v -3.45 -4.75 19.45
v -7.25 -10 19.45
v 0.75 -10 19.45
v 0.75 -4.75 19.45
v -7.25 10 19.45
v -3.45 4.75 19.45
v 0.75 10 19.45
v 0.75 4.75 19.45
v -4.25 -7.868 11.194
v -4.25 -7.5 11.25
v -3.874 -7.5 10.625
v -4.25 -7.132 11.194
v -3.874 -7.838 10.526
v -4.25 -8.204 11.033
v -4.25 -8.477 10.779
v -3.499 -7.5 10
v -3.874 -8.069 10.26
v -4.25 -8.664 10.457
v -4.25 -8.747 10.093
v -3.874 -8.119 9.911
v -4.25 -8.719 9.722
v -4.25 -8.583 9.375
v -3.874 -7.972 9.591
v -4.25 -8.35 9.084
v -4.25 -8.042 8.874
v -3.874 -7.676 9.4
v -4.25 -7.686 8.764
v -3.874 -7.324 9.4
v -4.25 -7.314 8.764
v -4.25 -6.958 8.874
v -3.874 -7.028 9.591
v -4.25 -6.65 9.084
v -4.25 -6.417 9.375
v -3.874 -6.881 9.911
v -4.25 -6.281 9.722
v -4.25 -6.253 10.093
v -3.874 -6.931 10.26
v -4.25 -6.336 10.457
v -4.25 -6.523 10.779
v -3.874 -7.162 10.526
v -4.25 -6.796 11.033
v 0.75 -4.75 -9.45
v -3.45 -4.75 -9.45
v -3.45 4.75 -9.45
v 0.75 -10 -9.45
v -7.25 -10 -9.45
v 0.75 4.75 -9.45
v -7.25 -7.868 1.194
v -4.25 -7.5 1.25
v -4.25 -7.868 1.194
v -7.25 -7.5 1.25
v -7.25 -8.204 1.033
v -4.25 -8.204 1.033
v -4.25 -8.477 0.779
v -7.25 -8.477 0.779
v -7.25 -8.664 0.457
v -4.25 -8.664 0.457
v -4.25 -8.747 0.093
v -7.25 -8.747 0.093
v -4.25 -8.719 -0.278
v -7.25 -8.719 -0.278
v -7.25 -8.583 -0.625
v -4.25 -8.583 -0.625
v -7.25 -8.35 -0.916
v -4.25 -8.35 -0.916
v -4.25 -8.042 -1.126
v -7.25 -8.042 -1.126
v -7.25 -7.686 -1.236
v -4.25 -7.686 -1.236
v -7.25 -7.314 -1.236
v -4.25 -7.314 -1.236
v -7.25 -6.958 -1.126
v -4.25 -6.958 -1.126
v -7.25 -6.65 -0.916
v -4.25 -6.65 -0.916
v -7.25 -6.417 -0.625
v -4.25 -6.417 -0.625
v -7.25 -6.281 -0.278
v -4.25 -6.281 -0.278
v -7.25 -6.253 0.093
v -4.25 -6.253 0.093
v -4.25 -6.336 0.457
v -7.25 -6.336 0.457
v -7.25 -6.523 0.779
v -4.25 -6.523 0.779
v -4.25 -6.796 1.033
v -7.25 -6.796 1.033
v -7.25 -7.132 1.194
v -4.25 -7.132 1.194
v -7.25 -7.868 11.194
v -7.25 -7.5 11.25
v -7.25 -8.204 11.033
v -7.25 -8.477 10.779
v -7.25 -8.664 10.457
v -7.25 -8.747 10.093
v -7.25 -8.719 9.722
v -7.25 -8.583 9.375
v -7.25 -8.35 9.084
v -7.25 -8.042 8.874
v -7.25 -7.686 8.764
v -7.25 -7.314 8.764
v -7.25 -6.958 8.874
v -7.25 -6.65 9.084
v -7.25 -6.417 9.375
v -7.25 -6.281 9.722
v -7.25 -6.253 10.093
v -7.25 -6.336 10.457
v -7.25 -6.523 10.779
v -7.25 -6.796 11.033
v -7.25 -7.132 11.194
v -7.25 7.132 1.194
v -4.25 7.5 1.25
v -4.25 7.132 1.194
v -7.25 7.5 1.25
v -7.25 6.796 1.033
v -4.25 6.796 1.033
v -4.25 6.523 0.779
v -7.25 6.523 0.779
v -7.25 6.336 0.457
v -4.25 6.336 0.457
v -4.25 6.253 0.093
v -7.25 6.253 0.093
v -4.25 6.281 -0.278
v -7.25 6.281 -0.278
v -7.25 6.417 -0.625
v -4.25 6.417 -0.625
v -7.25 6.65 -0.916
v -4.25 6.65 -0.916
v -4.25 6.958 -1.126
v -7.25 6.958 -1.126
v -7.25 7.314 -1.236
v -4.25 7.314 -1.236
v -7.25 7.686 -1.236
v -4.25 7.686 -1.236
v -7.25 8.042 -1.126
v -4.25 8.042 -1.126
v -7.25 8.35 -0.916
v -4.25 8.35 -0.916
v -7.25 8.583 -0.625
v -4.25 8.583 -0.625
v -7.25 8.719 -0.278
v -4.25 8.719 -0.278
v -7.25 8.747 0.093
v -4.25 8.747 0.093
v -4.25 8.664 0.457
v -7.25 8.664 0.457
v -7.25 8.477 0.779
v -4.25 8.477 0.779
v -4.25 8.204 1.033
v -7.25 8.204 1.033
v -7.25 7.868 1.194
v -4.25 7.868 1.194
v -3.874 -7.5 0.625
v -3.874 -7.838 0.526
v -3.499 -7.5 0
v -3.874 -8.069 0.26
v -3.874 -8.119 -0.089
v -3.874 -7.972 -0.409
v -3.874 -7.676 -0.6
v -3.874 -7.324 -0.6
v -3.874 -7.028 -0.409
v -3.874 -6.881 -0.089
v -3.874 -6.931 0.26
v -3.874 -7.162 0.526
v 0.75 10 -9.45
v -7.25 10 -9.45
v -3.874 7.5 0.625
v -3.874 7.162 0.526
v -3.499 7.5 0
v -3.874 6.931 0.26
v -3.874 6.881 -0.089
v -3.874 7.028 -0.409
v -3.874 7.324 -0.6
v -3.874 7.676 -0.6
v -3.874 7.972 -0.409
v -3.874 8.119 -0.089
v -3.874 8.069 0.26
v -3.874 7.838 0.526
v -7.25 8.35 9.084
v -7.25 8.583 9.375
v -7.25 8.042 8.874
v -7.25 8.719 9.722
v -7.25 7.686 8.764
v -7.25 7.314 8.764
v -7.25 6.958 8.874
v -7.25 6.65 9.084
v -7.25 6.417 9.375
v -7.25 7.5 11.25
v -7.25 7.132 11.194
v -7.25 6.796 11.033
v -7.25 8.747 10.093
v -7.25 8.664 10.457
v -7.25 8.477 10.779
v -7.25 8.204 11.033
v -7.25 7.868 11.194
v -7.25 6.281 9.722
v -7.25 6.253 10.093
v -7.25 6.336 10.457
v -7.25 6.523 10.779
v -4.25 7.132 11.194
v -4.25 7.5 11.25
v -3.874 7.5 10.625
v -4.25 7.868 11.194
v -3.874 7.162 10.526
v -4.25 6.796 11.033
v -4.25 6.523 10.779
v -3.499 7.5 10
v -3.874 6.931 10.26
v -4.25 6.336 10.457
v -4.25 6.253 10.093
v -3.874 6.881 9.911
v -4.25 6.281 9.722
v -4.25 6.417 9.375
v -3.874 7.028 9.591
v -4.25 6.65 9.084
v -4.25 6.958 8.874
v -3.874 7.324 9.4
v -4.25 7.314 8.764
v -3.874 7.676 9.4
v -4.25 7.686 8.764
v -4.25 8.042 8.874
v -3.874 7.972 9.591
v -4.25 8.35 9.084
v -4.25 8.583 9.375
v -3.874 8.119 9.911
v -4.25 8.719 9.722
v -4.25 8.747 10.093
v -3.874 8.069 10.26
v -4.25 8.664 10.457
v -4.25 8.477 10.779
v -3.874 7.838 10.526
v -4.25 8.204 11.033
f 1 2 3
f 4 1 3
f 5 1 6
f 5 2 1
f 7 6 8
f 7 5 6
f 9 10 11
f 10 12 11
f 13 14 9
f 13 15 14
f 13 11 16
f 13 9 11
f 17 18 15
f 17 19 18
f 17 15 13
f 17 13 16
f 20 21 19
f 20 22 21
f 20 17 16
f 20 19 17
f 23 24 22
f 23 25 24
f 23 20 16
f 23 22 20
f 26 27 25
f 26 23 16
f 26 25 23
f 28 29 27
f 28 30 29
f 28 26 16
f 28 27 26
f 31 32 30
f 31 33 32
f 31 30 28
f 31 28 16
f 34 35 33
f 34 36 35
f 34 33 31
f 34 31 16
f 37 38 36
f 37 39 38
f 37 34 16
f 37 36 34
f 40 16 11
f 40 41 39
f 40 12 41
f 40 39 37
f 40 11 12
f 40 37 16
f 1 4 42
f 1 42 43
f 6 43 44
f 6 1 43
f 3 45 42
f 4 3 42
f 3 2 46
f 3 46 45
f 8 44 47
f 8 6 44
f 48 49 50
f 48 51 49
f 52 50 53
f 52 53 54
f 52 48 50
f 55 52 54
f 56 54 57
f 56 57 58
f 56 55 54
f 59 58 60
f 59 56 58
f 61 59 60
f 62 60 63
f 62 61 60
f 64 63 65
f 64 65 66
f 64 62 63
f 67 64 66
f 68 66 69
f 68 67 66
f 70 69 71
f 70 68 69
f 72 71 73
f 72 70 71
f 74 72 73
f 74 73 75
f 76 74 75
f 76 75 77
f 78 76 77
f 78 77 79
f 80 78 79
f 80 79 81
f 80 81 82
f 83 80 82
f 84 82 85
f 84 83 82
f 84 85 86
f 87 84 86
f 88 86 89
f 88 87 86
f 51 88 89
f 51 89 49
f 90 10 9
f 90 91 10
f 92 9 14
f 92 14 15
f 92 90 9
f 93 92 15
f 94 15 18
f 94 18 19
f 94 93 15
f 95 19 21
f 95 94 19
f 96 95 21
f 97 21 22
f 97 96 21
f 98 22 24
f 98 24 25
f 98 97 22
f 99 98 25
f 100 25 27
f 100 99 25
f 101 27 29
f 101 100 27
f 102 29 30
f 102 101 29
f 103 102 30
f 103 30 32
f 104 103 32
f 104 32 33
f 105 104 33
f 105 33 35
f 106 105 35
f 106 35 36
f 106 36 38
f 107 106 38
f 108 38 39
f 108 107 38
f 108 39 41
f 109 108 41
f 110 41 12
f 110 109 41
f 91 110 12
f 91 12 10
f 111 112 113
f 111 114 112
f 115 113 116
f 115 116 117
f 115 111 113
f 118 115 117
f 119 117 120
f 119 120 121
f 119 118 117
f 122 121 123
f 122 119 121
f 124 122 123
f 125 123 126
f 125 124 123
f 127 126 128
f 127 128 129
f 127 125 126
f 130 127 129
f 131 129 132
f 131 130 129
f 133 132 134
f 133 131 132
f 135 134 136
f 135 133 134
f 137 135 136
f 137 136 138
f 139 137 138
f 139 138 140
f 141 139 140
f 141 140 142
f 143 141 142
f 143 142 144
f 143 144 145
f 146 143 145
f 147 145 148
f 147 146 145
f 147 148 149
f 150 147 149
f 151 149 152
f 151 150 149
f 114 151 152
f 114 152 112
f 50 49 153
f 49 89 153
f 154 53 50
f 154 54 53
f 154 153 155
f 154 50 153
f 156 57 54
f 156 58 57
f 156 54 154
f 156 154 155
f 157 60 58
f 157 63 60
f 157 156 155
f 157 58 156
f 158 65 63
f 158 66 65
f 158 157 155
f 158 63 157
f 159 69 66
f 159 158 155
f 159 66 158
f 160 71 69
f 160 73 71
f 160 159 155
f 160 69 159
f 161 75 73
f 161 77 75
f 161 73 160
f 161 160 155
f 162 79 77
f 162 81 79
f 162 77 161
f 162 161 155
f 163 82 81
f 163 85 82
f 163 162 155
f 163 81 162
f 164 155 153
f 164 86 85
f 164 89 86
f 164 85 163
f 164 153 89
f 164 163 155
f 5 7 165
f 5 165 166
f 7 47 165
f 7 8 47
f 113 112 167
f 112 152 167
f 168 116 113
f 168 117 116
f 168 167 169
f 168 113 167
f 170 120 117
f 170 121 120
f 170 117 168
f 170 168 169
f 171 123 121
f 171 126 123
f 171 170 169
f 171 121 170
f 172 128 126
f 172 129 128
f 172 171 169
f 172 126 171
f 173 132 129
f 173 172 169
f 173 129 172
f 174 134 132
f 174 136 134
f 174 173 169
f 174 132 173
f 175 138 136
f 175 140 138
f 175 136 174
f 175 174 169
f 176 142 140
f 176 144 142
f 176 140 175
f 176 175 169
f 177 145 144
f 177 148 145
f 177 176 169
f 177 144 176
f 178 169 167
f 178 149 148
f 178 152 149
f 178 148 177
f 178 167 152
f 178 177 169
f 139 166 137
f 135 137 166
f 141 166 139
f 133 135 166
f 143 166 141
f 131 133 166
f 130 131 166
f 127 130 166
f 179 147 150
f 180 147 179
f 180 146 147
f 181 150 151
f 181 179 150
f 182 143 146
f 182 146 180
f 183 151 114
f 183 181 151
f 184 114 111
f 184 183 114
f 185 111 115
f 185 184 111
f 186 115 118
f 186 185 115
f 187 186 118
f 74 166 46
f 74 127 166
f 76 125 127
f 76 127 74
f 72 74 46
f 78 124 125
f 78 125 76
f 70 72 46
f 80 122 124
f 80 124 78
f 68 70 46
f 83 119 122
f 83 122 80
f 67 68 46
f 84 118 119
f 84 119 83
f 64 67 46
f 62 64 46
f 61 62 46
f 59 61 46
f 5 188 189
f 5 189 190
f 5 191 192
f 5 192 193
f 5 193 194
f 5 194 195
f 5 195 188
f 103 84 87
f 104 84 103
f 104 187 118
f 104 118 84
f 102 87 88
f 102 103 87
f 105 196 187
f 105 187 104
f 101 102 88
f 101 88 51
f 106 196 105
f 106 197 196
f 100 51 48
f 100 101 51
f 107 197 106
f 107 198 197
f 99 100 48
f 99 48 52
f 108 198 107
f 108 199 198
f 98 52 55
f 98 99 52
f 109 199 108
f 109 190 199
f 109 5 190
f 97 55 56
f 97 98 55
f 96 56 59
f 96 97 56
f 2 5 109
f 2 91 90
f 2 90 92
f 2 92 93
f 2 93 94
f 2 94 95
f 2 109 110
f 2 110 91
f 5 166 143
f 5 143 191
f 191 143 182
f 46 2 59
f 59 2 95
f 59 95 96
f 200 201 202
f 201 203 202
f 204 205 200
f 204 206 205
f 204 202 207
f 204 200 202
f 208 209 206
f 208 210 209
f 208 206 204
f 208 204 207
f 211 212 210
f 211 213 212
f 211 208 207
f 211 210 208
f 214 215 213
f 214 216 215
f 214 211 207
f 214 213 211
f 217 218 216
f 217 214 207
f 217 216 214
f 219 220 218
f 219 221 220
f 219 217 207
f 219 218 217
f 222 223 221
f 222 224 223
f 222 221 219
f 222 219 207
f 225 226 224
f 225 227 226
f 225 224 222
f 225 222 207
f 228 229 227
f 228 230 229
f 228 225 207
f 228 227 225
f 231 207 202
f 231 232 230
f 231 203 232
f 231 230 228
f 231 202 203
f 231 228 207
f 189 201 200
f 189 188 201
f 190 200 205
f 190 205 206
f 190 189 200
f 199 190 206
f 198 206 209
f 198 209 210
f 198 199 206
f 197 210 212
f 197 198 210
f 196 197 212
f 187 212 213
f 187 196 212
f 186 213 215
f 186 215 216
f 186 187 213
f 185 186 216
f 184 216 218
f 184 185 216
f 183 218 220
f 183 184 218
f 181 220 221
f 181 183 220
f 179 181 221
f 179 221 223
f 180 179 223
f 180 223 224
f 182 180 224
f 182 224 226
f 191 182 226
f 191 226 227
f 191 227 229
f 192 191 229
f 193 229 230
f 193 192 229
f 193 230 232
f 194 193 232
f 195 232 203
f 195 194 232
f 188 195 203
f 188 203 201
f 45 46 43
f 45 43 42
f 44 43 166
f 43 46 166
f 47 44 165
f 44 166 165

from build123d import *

# Parameters (mm, degrees)
SKETCH1_W                      = 6.5
SKETCH1_H                      = 9
BOSS_EXTRUDE1_DEPTH            = 150
BOSS_EXTRUDE2_DEPTH            = 14.45
M3X0_5_TAPPED_HOLE1_AT_2_COUNT = 2
M3X0_5_TAPPED_HOLE1_AT_2_PITCH = 18.027756377
M3X0_5_TAPPED_HOLE1_AT_3_COUNT = 2
M3X0_5_TAPPED_HOLE1_AT_3_PITCH = 15
M3X0_5_TAPPED_HOLE1_AT_4_COUNT = 2
M3X0_5_TAPPED_HOLE1_AT_4_PITCH = 10
LPATTERN1_COUNT                = 15
LPATTERN1_PITCH                = 20


with BuildPart() as part:
    # Sketch1 → Boss-Extrude1 (new body, symmetric)
    with BuildSketch(Plane.XY):
        Rectangle(SKETCH1_W, SKETCH1_H)
    extrude(amount=BOSS_EXTRUDE1_DEPTH, both=True)

    # Sketch6 → CBORE for M3 SHCS1 (revolve, cut)
    with BuildSketch(Plane(origin=(-3.25, 0, -140), x_dir=(0, 0, 1), z_dir=(0, 1, 0))):
        Polygon((0, 0), (0, 6.5), (1.8, 6.5), (1.8, 3), (3.25, 3), (3.25, 0), align=None)
    cbore_for_m3_shcs1 = revolve(axis=Axis((-9.6, 0, -140), (1, 0, 0)), mode=Mode.SUBTRACT)

    # LPattern1: CBORE for M3 SHCS1 ×15
    with Locations(*[(0, 0, i * LPATTERN1_PITCH) for i in range(1, LPATTERN1_COUNT)]):
        add(cbore_for_m3_shcs1, mode=Mode.SUBTRACT)


with BuildPart() as body_2:
    # Sketch2 → Boss-Extrude2 (new body, symmetric)
    with BuildSketch(Plane.XY):
        Polygon((0.75, 4.75), (0.75, 10), (-7.25, 10), (-7.25, -10), (0.75, -10), (0.75, -4.75), (-3.45, -4.75), (-3.45, 4.75), align=None)
    extrude(amount=BOSS_EXTRUDE2_DEPTH, both=True)

    # Sketch4 → M3x0.5 Tapped Hole1 (revolve, cut)
    with BuildSketch(Plane(origin=(-7.25, 7.5, -5), x_dir=(0, 0, 1), z_dir=(0, 1, 0))):
        Polygon((0, 0), (0, 3.751075774), (1.25, 3), (1.25, 0), align=None)
    m3x0_5_tapped_hole1 = revolve(axis=Axis((-13.6, 7.5, -5), (1, 0, 0)), mode=Mode.SUBTRACT)

    # M3x0.5 Tapped Hole1 at 2: M3x0.5 Tapped Hole1 ×2
    with Locations(*[Vector(0, -0.832050294, 0.554700196) * (i * M3X0_5_TAPPED_HOLE1_AT_2_PITCH) for i in range(1, M3X0_5_TAPPED_HOLE1_AT_2_COUNT)]):
        add(m3x0_5_tapped_hole1, mode=Mode.SUBTRACT)

    # M3x0.5 Tapped Hole1 at 3: M3x0.5 Tapped Hole1 ×2
    with Locations(*[(0, -i * M3X0_5_TAPPED_HOLE1_AT_3_PITCH, 0) for i in range(1, M3X0_5_TAPPED_HOLE1_AT_3_COUNT)]):
        add(m3x0_5_tapped_hole1, mode=Mode.SUBTRACT)

    # M3x0.5 Tapped Hole1 at 4: M3x0.5 Tapped Hole1 ×2
    with Locations(*[(0, 0, i * M3X0_5_TAPPED_HOLE1_AT_4_PITCH) for i in range(1, M3X0_5_TAPPED_HOLE1_AT_4_COUNT)]):
        add(m3x0_5_tapped_hole1, mode=Mode.SUBTRACT)


with BuildPart() as body_2_1:
    # Body-Move/Copy1: moved
    add(body_2.part.moved(Location((0, 0, 5))))


solid = body_2_1.part
